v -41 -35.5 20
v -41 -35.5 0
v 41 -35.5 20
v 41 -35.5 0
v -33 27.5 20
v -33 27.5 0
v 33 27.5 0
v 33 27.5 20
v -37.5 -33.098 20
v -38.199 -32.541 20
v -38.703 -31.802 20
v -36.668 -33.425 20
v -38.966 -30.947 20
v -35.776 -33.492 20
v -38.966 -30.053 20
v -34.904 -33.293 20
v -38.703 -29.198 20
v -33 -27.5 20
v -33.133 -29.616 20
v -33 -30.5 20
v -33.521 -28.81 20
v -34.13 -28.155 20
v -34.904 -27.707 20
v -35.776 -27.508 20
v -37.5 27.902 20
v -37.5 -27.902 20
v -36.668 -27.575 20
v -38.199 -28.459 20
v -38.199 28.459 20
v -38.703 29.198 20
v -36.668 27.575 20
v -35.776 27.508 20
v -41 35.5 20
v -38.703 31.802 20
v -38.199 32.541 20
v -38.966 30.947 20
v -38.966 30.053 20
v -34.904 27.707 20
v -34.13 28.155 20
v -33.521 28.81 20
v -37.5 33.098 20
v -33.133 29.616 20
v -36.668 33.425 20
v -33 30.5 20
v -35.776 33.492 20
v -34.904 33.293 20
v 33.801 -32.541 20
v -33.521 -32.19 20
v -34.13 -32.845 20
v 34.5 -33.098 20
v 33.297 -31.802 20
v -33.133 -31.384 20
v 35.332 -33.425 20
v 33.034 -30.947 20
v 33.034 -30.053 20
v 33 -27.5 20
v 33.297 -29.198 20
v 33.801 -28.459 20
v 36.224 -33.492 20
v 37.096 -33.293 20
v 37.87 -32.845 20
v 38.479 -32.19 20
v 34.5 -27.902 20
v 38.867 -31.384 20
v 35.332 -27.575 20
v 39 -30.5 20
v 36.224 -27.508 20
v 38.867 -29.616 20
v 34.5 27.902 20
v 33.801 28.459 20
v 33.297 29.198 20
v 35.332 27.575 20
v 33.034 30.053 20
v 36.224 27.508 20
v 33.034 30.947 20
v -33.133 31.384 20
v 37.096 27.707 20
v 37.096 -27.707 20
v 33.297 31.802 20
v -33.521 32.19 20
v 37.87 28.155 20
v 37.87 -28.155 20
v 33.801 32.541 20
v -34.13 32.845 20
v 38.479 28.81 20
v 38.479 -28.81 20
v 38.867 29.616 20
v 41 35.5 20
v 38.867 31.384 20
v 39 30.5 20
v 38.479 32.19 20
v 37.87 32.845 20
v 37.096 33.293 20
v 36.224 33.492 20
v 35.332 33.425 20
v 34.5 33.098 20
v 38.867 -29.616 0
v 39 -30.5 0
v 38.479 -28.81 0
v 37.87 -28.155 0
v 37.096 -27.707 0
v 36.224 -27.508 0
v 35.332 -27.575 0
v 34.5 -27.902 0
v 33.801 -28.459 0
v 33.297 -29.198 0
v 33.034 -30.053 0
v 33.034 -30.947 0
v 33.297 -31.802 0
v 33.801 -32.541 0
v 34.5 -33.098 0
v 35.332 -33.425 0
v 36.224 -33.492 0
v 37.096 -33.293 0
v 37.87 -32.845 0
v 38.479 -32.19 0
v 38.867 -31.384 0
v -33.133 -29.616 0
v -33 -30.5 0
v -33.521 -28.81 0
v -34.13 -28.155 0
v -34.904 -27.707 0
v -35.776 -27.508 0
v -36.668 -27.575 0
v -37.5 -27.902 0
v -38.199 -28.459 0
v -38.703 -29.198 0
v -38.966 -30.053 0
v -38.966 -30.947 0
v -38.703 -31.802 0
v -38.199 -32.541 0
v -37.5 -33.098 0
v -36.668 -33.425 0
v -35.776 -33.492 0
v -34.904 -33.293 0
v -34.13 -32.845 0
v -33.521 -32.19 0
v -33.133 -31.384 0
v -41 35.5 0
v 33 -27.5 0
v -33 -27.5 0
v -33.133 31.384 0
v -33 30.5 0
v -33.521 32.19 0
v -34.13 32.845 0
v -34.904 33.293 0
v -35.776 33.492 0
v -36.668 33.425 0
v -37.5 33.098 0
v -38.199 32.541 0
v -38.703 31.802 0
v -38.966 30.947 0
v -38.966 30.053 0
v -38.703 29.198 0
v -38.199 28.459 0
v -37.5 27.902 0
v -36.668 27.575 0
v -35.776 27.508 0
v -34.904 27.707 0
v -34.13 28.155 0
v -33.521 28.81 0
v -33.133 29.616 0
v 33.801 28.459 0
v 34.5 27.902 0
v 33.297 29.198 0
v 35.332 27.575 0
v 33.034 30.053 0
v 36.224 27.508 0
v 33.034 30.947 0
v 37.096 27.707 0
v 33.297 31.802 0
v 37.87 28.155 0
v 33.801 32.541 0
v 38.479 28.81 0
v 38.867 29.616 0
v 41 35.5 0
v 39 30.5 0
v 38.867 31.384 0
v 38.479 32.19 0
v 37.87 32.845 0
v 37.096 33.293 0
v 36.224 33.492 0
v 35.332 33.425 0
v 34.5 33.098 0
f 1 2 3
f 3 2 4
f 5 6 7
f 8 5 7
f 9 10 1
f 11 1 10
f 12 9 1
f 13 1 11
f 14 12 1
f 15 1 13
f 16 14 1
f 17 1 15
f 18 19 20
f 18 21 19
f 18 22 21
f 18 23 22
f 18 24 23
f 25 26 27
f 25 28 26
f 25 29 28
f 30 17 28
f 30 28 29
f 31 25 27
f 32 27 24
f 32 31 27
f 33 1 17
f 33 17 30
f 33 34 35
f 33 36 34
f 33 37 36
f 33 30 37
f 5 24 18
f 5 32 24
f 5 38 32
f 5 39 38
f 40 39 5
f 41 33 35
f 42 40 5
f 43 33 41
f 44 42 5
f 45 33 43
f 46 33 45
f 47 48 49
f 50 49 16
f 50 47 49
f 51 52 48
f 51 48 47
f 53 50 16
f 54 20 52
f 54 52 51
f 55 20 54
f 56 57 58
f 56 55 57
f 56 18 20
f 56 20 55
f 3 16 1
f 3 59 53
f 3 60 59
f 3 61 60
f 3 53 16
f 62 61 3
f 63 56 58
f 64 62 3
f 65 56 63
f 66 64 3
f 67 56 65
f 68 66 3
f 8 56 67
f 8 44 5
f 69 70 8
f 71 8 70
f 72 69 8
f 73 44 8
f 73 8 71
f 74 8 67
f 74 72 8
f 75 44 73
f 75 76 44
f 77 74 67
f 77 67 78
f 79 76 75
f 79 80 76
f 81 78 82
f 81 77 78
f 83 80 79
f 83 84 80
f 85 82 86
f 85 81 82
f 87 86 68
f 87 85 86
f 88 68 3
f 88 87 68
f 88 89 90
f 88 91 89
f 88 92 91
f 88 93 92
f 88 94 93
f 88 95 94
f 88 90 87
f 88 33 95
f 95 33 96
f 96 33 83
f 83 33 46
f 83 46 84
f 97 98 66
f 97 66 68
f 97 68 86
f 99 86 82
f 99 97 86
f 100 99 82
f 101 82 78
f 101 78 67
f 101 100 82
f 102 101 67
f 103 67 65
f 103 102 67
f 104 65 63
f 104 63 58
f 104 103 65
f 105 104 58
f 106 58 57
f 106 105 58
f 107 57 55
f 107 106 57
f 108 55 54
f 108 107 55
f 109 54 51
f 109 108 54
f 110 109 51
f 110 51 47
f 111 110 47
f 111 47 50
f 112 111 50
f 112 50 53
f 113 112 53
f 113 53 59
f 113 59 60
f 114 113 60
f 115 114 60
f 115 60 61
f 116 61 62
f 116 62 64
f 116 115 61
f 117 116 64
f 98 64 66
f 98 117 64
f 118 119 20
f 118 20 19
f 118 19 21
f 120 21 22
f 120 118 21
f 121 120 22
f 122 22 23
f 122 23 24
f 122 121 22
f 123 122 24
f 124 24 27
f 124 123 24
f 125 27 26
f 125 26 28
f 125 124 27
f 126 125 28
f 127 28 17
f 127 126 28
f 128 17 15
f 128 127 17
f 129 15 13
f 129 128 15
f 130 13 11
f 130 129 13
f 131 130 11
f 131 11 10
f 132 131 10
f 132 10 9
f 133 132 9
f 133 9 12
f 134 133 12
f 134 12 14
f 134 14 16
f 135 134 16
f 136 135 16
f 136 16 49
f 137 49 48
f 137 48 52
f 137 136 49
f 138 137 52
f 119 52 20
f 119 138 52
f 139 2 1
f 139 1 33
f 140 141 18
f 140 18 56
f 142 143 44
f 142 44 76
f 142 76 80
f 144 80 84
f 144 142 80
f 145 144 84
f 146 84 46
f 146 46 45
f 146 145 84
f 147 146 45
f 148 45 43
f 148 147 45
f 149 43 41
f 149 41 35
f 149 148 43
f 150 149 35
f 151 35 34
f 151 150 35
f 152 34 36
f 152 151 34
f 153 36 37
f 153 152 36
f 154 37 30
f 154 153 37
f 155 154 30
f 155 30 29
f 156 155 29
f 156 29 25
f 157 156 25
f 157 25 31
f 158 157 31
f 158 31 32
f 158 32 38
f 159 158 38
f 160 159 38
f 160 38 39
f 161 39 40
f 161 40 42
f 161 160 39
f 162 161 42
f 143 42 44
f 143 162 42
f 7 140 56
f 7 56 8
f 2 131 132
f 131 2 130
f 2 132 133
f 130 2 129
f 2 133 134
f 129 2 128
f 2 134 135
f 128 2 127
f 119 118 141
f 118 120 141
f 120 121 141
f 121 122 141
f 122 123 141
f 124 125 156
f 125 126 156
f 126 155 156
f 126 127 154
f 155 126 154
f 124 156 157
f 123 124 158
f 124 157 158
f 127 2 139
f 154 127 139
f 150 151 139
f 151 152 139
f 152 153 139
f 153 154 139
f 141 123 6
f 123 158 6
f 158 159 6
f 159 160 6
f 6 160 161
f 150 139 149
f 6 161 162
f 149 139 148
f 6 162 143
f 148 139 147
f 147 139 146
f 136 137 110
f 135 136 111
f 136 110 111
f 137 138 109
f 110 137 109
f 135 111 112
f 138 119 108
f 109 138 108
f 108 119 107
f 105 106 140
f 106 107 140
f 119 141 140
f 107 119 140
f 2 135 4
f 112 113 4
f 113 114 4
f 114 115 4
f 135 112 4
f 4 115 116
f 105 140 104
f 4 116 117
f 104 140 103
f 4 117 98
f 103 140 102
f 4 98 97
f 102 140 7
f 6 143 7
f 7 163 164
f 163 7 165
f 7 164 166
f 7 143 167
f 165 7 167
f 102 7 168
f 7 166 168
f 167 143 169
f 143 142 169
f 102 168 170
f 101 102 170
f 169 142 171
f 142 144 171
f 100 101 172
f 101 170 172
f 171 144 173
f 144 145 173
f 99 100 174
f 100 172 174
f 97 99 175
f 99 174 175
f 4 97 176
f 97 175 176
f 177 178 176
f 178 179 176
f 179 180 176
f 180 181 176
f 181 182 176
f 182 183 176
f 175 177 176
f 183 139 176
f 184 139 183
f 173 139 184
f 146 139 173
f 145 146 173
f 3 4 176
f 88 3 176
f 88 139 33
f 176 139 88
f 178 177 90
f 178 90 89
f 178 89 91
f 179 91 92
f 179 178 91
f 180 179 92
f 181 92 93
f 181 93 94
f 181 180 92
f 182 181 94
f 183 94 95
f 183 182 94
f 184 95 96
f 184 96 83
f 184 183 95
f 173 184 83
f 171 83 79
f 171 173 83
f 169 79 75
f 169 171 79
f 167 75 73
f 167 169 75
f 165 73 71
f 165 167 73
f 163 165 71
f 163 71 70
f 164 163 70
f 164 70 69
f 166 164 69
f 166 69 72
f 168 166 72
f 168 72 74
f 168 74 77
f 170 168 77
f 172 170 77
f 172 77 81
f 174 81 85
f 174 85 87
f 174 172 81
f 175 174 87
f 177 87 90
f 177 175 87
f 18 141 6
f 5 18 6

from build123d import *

# Parameters (mm, degrees)
SKETCH_1_W          = 82
SKETCH_1_H          = 71
SKETCH_1_R          = 3
SKETCH_1_W_2        = 66
SKETCH_1_H_2        = 55
EXTRUDE_1_DEPTH     = 20
SKETCH_1_3_R        = 3
CUT_EXTRUDE_1_DEPTH = 20


with BuildPart() as part:
    # 草图1 → 凸台-拉伸1 (new body)
    with BuildSketch(Plane.XY):
        Rectangle(SKETCH_1_W, SKETCH_1_H)
        with Locations((-36, 30.5)):
            Circle(SKETCH_1_R, mode=Mode.SUBTRACT)
        with Locations((-36, -30.5)):
            Circle(SKETCH_1_R, mode=Mode.SUBTRACT)
        Rectangle(SKETCH_1_W_2, SKETCH_1_H_2, mode=Mode.SUBTRACT)
    extrude(amount=EXTRUDE_1_DEPTH)

    # 草图1<3> → 切除-拉伸1 (cut)
    with BuildSketch(Plane.XY):
        with Locations((36, -30.5)):
            Circle(SKETCH_1_3_R)
        with Locations((36, 30.5)):
            Circle(SKETCH_1_3_R)
    extrude(amount=CUT_EXTRUDE_1_DEPTH, mode=Mode.SUBTRACT)


solid = part.part
